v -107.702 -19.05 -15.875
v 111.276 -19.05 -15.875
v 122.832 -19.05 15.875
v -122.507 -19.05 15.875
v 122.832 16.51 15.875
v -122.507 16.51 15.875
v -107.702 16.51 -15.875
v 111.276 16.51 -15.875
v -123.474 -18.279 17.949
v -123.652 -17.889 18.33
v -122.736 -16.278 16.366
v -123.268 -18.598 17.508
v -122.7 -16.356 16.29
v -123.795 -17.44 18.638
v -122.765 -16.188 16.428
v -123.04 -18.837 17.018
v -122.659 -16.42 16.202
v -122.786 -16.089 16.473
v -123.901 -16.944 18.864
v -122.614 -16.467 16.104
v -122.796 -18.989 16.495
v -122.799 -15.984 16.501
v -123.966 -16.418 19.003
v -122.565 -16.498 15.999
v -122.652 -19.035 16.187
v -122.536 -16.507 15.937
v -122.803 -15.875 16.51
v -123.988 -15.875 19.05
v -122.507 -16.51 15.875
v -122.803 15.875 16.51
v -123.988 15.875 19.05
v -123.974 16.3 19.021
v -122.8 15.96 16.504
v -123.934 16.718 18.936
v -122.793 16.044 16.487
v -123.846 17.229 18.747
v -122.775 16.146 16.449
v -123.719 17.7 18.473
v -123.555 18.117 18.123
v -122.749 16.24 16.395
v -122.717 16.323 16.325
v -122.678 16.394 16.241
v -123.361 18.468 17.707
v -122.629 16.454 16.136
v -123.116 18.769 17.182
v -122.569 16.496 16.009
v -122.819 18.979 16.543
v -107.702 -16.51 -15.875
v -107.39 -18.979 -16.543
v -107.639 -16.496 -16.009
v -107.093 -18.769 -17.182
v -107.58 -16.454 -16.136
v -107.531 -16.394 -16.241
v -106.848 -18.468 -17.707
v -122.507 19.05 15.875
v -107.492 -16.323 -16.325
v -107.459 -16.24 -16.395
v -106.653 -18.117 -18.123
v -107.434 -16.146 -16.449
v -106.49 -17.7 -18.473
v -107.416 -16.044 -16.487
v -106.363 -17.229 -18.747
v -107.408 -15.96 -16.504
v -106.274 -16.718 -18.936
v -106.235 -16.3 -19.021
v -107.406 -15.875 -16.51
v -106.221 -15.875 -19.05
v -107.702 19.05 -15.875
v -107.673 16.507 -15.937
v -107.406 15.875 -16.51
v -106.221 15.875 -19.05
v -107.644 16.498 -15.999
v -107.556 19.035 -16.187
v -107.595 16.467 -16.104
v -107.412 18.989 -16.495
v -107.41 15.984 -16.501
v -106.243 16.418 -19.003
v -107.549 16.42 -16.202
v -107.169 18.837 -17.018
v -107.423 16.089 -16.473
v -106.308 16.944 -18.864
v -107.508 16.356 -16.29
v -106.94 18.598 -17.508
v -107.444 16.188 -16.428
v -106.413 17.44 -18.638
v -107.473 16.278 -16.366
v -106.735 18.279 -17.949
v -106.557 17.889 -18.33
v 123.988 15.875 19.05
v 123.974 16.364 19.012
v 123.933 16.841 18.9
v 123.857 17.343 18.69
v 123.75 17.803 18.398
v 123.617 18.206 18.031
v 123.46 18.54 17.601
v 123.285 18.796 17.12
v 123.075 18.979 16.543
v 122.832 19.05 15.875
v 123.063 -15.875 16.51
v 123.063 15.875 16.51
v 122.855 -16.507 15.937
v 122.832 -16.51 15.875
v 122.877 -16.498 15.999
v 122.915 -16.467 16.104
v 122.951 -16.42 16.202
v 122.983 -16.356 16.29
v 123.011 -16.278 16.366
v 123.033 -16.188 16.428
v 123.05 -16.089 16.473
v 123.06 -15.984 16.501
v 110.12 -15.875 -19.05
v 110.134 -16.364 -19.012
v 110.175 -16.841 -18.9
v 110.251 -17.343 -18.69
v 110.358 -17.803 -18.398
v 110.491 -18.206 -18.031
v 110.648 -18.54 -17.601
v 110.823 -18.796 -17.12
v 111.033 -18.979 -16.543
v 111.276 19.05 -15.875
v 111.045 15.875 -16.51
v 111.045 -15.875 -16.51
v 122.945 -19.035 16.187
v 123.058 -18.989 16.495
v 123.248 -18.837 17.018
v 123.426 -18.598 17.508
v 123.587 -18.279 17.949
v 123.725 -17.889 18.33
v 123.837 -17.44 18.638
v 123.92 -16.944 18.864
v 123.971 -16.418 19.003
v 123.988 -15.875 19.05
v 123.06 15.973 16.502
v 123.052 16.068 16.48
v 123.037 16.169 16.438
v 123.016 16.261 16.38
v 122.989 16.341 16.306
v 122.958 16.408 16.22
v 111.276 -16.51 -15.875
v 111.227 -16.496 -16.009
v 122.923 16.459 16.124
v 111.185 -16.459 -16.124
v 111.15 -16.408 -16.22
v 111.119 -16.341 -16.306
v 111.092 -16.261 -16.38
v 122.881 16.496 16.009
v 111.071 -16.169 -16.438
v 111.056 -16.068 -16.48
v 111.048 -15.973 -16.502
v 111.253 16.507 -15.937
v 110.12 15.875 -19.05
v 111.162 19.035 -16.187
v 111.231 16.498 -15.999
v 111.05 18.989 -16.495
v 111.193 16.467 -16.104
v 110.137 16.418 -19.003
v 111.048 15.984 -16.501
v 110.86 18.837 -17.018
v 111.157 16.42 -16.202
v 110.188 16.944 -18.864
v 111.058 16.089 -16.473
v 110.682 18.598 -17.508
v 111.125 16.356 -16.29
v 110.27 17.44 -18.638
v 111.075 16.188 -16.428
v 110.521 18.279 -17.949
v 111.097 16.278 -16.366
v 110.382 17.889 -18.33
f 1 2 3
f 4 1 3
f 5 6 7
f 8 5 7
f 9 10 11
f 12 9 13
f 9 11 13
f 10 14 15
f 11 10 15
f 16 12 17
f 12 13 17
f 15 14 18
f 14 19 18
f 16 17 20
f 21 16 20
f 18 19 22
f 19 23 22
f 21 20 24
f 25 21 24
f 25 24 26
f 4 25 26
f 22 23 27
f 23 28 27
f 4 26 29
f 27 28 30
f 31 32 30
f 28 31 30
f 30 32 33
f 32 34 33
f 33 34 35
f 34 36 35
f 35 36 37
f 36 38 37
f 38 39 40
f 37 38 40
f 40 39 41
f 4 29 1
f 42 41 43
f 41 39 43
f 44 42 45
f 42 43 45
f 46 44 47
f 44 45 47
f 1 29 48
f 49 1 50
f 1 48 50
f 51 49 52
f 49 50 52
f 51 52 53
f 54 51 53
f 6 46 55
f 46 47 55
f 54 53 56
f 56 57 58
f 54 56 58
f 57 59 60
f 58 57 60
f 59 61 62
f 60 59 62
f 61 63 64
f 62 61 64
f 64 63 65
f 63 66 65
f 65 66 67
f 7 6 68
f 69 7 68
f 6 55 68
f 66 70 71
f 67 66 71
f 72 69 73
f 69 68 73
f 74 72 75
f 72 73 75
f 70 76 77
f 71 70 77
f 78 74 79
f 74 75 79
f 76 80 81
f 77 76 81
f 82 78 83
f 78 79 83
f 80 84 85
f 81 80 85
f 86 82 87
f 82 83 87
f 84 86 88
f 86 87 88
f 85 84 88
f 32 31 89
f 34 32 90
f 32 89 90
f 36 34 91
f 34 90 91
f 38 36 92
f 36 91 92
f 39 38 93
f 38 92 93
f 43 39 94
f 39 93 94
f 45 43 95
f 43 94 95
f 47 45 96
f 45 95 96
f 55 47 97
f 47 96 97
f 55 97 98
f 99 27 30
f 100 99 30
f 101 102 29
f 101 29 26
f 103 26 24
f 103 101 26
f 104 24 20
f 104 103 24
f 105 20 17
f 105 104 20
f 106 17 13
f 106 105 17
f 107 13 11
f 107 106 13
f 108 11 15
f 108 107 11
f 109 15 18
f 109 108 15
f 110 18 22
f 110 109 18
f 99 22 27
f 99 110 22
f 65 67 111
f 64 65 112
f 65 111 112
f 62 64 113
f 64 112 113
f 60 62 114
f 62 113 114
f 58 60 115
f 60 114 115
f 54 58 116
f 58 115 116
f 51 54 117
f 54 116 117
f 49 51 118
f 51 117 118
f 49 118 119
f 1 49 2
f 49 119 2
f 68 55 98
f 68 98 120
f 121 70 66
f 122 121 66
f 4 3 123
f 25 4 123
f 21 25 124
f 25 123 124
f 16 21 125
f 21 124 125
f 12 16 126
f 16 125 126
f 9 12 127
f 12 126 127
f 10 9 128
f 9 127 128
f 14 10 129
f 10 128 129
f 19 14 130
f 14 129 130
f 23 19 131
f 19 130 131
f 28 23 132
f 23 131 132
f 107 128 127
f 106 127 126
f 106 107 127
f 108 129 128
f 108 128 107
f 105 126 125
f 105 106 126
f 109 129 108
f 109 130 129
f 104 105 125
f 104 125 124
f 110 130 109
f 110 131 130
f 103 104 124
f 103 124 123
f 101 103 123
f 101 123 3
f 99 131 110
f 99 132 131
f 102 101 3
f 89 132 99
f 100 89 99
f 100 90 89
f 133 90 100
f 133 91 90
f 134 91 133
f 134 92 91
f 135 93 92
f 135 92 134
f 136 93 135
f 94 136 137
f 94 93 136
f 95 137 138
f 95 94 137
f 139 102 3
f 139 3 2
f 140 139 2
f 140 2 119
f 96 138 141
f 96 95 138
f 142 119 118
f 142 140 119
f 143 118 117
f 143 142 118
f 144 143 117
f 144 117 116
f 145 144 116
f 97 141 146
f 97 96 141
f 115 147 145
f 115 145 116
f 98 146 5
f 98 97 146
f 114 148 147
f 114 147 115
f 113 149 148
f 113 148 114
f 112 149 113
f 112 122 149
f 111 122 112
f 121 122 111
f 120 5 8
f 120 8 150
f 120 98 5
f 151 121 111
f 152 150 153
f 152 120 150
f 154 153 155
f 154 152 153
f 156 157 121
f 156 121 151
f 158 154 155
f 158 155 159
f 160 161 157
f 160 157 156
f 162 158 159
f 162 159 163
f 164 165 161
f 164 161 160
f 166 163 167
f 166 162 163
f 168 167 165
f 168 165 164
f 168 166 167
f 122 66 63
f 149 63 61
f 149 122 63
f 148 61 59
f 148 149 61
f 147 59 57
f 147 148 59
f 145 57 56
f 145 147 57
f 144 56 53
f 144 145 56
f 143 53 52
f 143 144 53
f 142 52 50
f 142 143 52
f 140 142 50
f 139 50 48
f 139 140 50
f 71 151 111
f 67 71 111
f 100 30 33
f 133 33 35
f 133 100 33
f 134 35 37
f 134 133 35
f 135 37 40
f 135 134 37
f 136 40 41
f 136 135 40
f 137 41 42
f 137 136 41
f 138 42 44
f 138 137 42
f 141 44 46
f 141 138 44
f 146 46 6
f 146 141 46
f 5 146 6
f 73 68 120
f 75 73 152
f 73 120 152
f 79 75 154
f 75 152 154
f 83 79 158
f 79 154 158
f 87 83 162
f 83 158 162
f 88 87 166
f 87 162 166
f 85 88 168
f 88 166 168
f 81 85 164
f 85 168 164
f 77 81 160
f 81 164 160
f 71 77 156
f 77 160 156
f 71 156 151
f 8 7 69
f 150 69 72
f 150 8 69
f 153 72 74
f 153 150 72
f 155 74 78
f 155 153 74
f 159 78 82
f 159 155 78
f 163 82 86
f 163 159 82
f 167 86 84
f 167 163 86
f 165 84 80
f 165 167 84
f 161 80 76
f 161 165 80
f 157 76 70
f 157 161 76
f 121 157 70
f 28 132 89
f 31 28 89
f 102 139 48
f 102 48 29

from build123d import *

# Parameters (mm, degrees)
EXTRUDE_THIN1_DEPTH     = 123.98756
CUT_EXTRUDE1_DEPTH      = 1
CUT_EXTRUDE1_DEPTH_BACK = 39.1
CUT_EXTRUDE2_DEPTH      = 1
CUT_EXTRUDE2_DEPTH_BACK = 39.1


with BuildPart() as part:
    # Sketch1 → Extrude-Thin1 (new body, symmetric)
    with BuildSketch(Plane(origin=(0, 0, 0), x_dir=(0, 0, -1), z_dir=(1, 0, 0))):
        with BuildLine():
            Line((-15.875, 19.05), (15.875, 19.05))
            ThreePointArc((15.875, 19.05), (18.12006403, 18.12006403), (19.05, 15.875))
            Line((19.05, 15.875), (19.05, -15.875))
            ThreePointArc((19.05, -15.875), (18.12006403, -18.12006403), (15.875, -19.05))
            Line((15.875, -19.05), (-15.875, -19.05))
            ThreePointArc((-15.875, -19.05), (-18.12006403, -18.12006403), (-19.05, -15.875))
            Line((-19.05, -15.875), (-19.05, 15.875))
            ThreePointArc((-19.05, 15.875), (-18.12006403, 18.12006403), (-15.875, 19.05))
        make_face()
        with BuildLine():
            Line((-15.875, 16.51), (15.875, 16.51))
            ThreePointArc((15.875, 16.51), (16.324012806, 16.324012806), (16.51, 15.875))
            Line((16.51, 15.875), (16.51, -15.875))
            ThreePointArc((16.51, -15.875), (16.324012806, -16.324012806), (15.875, -16.51))
            Line((15.875, -16.51), (-15.875, -16.51))
            ThreePointArc((-15.875, -16.51), (-16.324012806, -16.324012806), (-16.51, -15.875))
            Line((-16.51, -15.875), (-16.51, 15.875))
            ThreePointArc((-16.51, 15.875), (-16.324012806, 16.324012806), (-15.875, 16.51))
        make_face(mode=Mode.SUBTRACT)
    extrude(amount=EXTRUDE_THIN1_DEPTH, both=True)

    # Sketch3 → Cut-Extrude1 (cut, two sides)
    with BuildSketch(Plane(origin=(0, 19.05, 0), x_dir=(1, 0, 0), z_dir=(0, 1, 0))) as cut_extrude1_sk:
        Polygon((299.02319091, -499.956443526), (123.98756, -19.05), (110.120294074, 19.05), (-64.915336836, 499.956443526), (896.897550216, 850.027705346), (1260.836077962, -149.885181705), align=None)
    extrude(amount=CUT_EXTRUDE1_DEPTH, mode=Mode.SUBTRACT)
    extrude(cut_extrude1_sk.sketch, amount=-CUT_EXTRUDE1_DEPTH_BACK, mode=Mode.SUBTRACT)

    # Sketch4 → Cut-Extrude2 (cut, two sides)
    with BuildSketch(Plane(origin=(0, 19.05, 0), x_dir=(1, 0, 0), z_dir=(0, 1, 0))) as cut_extrude2_sk:
        Polygon((-340.270885768, -482.871088899), (-123.98756, -19.05), (-106.221238224, 19.05), (110.062087543, 482.871088899), (-817.580090255, 915.437740434), (-1267.913063566, -50.304437364), align=None)
    extrude(amount=CUT_EXTRUDE2_DEPTH, mode=Mode.SUBTRACT)
    extrude(cut_extrude2_sk.sketch, amount=-CUT_EXTRUDE2_DEPTH_BACK, mode=Mode.SUBTRACT)


solid = part.part
